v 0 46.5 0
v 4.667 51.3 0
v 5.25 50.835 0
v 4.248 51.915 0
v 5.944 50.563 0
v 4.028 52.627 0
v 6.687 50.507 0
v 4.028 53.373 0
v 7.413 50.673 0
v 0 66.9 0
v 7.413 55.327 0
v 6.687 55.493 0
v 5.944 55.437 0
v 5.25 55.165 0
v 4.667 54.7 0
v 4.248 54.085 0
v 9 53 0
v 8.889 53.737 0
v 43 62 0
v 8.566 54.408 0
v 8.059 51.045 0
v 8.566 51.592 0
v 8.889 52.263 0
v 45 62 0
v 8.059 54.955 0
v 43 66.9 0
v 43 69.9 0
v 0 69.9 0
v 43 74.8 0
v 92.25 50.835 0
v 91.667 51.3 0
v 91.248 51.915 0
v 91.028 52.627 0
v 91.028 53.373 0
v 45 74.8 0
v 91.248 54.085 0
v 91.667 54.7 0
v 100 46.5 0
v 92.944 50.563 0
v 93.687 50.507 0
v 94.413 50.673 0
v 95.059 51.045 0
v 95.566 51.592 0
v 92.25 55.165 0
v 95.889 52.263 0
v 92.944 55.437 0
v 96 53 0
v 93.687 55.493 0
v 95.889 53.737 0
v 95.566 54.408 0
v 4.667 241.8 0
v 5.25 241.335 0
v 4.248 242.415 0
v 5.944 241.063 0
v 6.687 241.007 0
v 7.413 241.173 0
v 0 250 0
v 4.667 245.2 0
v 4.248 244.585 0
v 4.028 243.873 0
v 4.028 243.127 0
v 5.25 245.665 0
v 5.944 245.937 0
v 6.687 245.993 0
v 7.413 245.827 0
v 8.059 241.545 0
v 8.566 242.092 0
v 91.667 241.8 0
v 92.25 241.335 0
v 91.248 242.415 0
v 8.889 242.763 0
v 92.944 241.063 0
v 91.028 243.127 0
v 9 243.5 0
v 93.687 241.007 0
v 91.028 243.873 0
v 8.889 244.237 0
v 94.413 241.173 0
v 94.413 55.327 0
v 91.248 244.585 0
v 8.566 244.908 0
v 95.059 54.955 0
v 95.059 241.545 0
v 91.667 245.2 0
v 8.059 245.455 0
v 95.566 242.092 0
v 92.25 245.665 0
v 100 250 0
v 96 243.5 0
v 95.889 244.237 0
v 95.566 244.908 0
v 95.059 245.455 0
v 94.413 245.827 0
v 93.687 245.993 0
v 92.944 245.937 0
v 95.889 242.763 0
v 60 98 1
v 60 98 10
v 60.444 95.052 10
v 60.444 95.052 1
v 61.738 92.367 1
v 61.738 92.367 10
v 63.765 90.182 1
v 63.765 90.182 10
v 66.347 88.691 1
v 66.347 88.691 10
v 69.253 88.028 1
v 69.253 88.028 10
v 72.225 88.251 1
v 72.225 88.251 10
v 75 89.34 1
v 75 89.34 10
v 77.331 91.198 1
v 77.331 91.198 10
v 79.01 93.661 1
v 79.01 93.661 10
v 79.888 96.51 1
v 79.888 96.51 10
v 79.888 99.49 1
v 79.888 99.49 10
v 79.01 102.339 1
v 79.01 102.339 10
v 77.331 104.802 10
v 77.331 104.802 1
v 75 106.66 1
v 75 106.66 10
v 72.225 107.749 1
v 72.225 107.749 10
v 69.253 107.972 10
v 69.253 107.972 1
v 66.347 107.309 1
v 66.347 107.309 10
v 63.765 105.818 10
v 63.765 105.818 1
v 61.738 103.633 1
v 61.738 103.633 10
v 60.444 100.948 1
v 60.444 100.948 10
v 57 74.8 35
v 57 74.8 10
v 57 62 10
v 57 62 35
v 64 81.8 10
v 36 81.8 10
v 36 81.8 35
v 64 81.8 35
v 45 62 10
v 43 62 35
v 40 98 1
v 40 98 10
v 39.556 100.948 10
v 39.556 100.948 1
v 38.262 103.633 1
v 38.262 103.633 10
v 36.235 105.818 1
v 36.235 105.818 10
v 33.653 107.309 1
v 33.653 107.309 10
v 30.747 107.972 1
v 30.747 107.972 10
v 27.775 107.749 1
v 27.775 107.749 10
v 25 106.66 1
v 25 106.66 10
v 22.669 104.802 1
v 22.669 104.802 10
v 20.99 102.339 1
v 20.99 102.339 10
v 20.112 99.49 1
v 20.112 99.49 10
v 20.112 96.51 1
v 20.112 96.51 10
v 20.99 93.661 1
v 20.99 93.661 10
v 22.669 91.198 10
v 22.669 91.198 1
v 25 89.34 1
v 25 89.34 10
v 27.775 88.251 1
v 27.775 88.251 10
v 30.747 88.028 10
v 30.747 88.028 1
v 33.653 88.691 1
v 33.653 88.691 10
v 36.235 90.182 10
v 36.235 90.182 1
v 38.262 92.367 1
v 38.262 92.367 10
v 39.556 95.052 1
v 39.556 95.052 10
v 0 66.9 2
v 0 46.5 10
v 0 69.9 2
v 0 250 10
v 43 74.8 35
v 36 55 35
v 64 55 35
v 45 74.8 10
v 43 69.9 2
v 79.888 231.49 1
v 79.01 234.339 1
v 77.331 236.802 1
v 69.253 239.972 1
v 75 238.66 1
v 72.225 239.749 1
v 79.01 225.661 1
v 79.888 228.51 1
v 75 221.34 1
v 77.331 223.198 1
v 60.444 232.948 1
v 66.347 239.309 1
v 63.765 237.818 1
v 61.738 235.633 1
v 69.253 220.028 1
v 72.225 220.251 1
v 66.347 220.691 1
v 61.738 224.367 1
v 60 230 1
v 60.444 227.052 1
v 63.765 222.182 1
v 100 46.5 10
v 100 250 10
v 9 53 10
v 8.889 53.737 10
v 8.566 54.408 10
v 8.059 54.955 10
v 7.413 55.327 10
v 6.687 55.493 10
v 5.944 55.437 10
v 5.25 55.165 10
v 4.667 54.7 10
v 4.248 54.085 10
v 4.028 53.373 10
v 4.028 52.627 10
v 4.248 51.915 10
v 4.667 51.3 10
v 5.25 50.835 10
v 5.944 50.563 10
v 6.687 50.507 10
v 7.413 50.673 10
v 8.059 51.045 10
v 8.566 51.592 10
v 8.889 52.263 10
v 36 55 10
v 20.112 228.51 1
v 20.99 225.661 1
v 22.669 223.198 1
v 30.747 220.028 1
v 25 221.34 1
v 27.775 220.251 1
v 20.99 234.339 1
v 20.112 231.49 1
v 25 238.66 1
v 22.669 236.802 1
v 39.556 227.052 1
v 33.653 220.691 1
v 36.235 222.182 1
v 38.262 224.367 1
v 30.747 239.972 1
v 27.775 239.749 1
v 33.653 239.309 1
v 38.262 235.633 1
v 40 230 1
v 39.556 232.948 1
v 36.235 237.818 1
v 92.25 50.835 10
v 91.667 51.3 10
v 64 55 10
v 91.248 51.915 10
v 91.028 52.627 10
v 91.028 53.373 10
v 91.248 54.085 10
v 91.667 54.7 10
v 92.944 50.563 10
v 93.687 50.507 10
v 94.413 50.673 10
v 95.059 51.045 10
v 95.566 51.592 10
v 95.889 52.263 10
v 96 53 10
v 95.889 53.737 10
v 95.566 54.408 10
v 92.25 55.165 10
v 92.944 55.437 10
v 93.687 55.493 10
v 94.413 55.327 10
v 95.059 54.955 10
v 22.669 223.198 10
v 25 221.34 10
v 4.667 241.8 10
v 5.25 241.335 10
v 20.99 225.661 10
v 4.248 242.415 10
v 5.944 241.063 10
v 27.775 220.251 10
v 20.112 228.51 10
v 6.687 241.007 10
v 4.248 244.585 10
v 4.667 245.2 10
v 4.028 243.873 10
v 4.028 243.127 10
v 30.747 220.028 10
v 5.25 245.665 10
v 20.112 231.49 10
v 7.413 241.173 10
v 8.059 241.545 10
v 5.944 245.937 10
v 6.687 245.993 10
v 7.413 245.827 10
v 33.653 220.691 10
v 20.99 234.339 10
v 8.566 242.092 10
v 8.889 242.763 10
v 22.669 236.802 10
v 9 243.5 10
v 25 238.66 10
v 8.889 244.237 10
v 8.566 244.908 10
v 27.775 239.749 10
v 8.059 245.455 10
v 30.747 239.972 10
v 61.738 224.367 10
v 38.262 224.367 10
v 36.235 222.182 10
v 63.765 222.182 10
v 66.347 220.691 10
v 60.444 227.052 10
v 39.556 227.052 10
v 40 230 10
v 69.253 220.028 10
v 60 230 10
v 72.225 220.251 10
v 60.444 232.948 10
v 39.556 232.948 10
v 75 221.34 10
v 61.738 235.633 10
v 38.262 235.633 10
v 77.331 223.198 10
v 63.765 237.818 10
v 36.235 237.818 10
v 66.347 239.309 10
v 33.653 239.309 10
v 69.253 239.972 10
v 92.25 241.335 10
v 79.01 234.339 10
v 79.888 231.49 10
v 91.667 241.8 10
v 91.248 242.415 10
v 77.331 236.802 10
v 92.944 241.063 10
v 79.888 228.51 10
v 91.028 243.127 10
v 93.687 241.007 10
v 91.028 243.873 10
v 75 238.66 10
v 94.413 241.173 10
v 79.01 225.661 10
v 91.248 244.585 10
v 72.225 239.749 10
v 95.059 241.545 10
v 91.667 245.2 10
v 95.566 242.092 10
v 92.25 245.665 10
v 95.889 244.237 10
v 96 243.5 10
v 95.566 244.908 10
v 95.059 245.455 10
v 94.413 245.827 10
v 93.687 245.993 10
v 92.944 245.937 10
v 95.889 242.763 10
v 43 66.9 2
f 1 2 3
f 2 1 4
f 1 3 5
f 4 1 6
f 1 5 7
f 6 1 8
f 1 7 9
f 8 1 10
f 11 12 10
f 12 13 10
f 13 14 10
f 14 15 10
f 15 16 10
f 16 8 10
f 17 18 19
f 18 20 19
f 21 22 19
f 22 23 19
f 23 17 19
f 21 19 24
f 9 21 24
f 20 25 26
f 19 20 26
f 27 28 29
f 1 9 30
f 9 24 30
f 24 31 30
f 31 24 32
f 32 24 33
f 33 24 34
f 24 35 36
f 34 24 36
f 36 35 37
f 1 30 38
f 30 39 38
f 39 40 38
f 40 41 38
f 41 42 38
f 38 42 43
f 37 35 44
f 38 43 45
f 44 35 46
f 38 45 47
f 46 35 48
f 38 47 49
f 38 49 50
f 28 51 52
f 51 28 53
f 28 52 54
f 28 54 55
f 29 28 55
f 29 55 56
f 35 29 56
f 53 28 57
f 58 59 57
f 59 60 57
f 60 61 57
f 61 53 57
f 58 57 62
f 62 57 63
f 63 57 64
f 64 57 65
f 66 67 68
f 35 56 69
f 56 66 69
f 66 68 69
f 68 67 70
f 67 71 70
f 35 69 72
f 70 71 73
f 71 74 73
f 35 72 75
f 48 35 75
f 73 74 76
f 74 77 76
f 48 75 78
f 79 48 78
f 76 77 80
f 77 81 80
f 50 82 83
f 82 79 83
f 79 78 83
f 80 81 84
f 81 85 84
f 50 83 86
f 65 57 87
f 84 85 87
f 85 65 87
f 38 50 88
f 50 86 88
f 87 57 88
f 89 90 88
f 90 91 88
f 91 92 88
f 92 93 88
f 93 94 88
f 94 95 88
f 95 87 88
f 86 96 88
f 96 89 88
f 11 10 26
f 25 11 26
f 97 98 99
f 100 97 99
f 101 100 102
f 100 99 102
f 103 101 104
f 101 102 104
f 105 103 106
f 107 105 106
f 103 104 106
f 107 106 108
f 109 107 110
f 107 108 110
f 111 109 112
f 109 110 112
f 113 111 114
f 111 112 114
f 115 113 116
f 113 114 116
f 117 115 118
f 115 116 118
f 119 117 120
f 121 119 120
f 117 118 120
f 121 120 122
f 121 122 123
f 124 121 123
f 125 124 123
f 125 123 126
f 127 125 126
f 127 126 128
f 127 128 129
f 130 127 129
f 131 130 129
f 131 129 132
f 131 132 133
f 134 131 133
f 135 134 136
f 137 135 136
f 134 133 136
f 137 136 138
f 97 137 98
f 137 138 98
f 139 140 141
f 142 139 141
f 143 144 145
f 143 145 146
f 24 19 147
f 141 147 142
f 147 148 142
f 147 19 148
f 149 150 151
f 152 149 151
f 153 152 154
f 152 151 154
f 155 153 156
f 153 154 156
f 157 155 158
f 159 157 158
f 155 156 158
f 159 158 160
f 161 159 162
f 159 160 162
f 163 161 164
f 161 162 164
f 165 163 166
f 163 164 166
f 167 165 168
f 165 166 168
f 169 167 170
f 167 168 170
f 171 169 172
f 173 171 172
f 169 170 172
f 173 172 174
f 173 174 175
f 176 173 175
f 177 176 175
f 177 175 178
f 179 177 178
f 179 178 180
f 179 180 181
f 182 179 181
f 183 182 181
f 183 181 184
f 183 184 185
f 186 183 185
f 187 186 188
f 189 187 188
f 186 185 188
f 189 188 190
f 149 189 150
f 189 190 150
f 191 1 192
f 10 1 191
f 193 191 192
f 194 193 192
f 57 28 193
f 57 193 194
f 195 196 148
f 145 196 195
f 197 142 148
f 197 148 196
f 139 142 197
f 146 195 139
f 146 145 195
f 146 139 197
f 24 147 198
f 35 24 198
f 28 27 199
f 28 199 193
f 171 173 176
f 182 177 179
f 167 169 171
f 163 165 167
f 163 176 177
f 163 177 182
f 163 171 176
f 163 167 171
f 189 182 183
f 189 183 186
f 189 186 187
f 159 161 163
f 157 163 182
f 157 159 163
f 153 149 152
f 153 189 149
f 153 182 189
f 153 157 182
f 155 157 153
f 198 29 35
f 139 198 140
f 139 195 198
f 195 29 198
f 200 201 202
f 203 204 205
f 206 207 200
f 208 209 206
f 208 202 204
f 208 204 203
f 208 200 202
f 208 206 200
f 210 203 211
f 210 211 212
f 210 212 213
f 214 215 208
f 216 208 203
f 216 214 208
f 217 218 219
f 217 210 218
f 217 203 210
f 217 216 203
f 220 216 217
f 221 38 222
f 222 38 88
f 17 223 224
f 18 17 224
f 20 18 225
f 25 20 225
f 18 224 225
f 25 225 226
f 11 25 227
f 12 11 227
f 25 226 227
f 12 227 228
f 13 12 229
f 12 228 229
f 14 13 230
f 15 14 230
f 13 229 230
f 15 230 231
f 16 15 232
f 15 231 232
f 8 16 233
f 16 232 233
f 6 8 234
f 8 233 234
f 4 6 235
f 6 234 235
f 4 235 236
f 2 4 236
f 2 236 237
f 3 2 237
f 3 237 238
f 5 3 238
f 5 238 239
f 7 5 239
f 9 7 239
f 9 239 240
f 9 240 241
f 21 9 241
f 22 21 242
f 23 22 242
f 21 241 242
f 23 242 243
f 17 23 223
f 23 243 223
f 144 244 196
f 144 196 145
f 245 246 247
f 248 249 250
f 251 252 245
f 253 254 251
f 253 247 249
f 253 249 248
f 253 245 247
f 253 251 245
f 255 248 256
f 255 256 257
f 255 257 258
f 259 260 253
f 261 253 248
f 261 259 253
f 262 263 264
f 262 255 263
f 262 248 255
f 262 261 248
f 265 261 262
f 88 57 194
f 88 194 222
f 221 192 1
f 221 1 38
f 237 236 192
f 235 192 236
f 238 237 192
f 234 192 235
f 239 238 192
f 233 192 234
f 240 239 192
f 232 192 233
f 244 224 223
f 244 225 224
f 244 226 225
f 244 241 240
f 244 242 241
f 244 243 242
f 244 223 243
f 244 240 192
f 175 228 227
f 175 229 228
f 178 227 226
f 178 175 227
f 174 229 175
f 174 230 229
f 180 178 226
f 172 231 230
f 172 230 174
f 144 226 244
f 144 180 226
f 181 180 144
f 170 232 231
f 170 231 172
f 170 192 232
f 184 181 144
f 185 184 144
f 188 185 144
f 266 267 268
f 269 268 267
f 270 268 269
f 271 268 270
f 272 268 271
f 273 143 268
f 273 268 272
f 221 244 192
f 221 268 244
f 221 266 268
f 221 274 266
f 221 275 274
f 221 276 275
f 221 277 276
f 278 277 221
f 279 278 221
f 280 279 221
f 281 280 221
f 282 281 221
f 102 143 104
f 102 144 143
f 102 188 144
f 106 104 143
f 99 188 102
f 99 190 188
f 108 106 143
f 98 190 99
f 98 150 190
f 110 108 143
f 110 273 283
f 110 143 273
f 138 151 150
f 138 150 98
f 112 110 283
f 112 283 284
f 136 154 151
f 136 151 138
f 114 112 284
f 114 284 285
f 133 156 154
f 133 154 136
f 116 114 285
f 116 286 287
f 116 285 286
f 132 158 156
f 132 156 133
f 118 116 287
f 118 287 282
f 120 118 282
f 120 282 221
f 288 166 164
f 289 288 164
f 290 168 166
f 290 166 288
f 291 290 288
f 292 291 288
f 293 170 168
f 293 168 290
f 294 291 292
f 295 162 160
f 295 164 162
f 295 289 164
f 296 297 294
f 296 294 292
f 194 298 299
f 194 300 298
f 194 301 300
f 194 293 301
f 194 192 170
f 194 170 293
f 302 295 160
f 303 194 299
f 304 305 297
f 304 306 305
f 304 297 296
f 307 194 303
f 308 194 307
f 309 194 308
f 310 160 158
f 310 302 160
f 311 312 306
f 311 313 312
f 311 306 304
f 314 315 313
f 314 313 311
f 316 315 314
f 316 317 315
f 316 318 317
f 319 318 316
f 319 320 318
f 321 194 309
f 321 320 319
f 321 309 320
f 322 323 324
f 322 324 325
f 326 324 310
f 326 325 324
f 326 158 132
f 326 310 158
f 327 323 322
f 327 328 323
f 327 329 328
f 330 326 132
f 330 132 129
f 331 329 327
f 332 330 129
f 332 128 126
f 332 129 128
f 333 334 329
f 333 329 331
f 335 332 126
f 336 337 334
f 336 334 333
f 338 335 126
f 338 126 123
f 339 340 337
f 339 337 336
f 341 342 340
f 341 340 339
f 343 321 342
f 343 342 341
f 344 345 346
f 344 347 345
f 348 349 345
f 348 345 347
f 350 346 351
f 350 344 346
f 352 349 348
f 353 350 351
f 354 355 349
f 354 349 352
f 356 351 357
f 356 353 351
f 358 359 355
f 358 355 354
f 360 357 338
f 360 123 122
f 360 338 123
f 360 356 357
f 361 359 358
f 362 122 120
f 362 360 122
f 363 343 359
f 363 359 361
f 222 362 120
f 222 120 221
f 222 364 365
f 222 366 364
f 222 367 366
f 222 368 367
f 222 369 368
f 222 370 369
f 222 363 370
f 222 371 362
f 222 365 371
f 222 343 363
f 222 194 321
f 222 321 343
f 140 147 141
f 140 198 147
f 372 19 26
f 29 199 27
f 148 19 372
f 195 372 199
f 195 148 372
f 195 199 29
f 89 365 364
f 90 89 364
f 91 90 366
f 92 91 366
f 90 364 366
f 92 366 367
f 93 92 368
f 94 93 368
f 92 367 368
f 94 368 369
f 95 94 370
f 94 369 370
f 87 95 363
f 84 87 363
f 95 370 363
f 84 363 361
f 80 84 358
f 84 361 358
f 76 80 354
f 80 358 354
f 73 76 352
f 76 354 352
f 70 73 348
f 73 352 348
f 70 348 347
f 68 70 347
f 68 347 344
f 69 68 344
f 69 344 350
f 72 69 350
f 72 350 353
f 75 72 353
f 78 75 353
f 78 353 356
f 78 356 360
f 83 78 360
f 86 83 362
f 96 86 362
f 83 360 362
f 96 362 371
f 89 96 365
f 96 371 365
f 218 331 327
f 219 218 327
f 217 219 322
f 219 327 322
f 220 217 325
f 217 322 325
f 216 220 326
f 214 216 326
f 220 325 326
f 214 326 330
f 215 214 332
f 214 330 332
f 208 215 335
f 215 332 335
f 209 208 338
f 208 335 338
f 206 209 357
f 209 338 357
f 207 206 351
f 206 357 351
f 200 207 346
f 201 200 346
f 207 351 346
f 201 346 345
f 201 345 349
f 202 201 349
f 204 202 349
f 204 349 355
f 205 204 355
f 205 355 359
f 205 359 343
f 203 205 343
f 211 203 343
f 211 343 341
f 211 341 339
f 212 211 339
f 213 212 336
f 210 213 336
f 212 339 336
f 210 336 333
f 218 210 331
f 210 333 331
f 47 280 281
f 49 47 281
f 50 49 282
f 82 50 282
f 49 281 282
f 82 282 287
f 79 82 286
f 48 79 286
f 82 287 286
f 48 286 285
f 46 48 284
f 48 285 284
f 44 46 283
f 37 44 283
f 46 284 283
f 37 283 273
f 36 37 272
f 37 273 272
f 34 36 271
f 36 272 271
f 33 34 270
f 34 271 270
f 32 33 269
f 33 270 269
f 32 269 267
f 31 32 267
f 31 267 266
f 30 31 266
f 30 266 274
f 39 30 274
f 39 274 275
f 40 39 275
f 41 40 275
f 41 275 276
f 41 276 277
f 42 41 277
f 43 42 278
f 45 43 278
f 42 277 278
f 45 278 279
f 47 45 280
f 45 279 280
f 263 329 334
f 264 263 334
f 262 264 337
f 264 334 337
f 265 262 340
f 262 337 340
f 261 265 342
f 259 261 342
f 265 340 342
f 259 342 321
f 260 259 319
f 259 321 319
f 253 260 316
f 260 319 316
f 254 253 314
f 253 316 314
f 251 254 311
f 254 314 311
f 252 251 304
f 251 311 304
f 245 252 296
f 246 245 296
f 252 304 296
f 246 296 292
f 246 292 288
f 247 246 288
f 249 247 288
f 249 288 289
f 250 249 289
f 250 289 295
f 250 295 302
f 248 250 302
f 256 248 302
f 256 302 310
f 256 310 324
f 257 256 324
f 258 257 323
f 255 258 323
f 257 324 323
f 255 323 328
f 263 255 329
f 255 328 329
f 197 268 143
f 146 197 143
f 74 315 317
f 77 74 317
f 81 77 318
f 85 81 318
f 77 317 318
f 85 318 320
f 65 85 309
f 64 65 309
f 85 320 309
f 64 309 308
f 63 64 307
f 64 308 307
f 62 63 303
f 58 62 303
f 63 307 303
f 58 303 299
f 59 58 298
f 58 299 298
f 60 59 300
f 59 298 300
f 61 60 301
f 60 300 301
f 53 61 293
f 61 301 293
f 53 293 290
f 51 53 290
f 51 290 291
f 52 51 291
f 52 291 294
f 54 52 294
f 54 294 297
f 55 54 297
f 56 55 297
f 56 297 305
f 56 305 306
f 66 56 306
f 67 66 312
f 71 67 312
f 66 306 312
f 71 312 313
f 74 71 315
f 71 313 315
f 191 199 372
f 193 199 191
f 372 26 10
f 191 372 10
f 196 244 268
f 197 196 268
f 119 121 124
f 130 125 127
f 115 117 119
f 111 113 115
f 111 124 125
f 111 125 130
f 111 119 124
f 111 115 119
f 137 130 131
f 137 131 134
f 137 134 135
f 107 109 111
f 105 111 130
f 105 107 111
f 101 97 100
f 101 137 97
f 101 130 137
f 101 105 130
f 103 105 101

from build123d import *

# Parameters (mm, degrees)
ESBO_O1_W                = 100
ESBO_O1_H                = 250
RESSALTO_EXTRUS_O1_DEPTH = 10
ESBO_O7_R                = 10
CORTE_EXTRUS_O6_DEPTH    = 9
ESBO_O2_W                = 28
ESBO_O2_H                = 26.8
RESSALTO_EXTRUS_O3_DEPTH = 25
ESBO_O8_W                = 2
ESBO_O8_H                = 12.8
CORTE_EXTRUS_O7_DEPTH    = 10
ESBO_O9_W                = 43
ESBO_O9_H                = 3
CORTE_EXTRUS_O8_DEPTH    = 2
ESBO_O10_W               = 100
ESBO_O10_H               = 46.5
CORTE_EXTRUS_O9_DEPTH    = 12
SKETCH1_R                = 2.5
CUT_EXTRUDE1_DEPTH       = 10


with BuildPart() as part:
    # Esboço1 → Ressalto-extrusão1 (new body)
    with BuildSketch(Plane.XY):
        with Locations((50, 125)):
            Rectangle(ESBO_O1_W, ESBO_O1_H)
    extrude(amount=RESSALTO_EXTRUS_O1_DEPTH)

    # Esboço7 → Corte-extrusão6 (cut)
    with BuildSketch(Plane.XY.offset(10)):
        with Locations((30, 98)):
            Circle(ESBO_O7_R)
        with Locations((30, 230)):
            Circle(ESBO_O7_R)
        with Locations(Location((70, 230, 0), (0, 0, 180))):
            Circle(ESBO_O7_R)
        with Locations(Location((70, 98, 0), (0, 0, 180))):
            Circle(ESBO_O7_R)
    extrude(amount=-CORTE_EXTRUS_O6_DEPTH, mode=Mode.SUBTRACT)

    # Esboço2 → Ressalto-extrusão3 (add)
    with BuildSketch(Plane.XY.offset(10)):
        with Locations((50, 68.4)):
            Rectangle(ESBO_O2_W, ESBO_O2_H)
        Polygon((50, 62), (43, 62), (43, 74.8), (57, 74.8), (57, 62), align=None, mode=Mode.SUBTRACT)
    extrude(amount=RESSALTO_EXTRUS_O3_DEPTH)

    # Esboço8 → Corte-extrusão7 (cut)
    with BuildSketch(Plane.XY.offset(10)):
        with Locations((44, 68.4)):
            Rectangle(ESBO_O8_W, ESBO_O8_H)
    extrude(amount=-CORTE_EXTRUS_O7_DEPTH, mode=Mode.SUBTRACT)

    # Esboço9 → Corte-extrusão8 (cut)
    with BuildSketch(Plane(origin=(0, 0, 0), x_dir=(-1, 0, 0), z_dir=(0, 0, -1))):
        with Locations((-21.5, 68.4)):
            Rectangle(ESBO_O9_W, ESBO_O9_H)
    extrude(amount=-CORTE_EXTRUS_O8_DEPTH, mode=Mode.SUBTRACT)

    # Esboço10 → Corte-extrusão9 (cut)
    with BuildSketch(Plane.XY.offset(10)):
        with Locations((50, 23.25)):
            Rectangle(ESBO_O10_W, ESBO_O10_H)
    extrude(amount=-CORTE_EXTRUS_O9_DEPTH, mode=Mode.SUBTRACT)

    # Sketch1 → Cut-Extrude1 (cut)
    with BuildSketch(Plane.XY.offset(10)):
        with Locations((6.5, 243.5)):
            Circle(SKETCH1_R)
        with Locations((93.5, 243.5)):
            Circle(SKETCH1_R)
        with Locations((6.5, 53)):
            Circle(SKETCH1_R)
        with Locations((93.5, 53)):
            Circle(SKETCH1_R)
    extrude(amount=-CUT_EXTRUDE1_DEPTH, mode=Mode.SUBTRACT)


solid = part.part
